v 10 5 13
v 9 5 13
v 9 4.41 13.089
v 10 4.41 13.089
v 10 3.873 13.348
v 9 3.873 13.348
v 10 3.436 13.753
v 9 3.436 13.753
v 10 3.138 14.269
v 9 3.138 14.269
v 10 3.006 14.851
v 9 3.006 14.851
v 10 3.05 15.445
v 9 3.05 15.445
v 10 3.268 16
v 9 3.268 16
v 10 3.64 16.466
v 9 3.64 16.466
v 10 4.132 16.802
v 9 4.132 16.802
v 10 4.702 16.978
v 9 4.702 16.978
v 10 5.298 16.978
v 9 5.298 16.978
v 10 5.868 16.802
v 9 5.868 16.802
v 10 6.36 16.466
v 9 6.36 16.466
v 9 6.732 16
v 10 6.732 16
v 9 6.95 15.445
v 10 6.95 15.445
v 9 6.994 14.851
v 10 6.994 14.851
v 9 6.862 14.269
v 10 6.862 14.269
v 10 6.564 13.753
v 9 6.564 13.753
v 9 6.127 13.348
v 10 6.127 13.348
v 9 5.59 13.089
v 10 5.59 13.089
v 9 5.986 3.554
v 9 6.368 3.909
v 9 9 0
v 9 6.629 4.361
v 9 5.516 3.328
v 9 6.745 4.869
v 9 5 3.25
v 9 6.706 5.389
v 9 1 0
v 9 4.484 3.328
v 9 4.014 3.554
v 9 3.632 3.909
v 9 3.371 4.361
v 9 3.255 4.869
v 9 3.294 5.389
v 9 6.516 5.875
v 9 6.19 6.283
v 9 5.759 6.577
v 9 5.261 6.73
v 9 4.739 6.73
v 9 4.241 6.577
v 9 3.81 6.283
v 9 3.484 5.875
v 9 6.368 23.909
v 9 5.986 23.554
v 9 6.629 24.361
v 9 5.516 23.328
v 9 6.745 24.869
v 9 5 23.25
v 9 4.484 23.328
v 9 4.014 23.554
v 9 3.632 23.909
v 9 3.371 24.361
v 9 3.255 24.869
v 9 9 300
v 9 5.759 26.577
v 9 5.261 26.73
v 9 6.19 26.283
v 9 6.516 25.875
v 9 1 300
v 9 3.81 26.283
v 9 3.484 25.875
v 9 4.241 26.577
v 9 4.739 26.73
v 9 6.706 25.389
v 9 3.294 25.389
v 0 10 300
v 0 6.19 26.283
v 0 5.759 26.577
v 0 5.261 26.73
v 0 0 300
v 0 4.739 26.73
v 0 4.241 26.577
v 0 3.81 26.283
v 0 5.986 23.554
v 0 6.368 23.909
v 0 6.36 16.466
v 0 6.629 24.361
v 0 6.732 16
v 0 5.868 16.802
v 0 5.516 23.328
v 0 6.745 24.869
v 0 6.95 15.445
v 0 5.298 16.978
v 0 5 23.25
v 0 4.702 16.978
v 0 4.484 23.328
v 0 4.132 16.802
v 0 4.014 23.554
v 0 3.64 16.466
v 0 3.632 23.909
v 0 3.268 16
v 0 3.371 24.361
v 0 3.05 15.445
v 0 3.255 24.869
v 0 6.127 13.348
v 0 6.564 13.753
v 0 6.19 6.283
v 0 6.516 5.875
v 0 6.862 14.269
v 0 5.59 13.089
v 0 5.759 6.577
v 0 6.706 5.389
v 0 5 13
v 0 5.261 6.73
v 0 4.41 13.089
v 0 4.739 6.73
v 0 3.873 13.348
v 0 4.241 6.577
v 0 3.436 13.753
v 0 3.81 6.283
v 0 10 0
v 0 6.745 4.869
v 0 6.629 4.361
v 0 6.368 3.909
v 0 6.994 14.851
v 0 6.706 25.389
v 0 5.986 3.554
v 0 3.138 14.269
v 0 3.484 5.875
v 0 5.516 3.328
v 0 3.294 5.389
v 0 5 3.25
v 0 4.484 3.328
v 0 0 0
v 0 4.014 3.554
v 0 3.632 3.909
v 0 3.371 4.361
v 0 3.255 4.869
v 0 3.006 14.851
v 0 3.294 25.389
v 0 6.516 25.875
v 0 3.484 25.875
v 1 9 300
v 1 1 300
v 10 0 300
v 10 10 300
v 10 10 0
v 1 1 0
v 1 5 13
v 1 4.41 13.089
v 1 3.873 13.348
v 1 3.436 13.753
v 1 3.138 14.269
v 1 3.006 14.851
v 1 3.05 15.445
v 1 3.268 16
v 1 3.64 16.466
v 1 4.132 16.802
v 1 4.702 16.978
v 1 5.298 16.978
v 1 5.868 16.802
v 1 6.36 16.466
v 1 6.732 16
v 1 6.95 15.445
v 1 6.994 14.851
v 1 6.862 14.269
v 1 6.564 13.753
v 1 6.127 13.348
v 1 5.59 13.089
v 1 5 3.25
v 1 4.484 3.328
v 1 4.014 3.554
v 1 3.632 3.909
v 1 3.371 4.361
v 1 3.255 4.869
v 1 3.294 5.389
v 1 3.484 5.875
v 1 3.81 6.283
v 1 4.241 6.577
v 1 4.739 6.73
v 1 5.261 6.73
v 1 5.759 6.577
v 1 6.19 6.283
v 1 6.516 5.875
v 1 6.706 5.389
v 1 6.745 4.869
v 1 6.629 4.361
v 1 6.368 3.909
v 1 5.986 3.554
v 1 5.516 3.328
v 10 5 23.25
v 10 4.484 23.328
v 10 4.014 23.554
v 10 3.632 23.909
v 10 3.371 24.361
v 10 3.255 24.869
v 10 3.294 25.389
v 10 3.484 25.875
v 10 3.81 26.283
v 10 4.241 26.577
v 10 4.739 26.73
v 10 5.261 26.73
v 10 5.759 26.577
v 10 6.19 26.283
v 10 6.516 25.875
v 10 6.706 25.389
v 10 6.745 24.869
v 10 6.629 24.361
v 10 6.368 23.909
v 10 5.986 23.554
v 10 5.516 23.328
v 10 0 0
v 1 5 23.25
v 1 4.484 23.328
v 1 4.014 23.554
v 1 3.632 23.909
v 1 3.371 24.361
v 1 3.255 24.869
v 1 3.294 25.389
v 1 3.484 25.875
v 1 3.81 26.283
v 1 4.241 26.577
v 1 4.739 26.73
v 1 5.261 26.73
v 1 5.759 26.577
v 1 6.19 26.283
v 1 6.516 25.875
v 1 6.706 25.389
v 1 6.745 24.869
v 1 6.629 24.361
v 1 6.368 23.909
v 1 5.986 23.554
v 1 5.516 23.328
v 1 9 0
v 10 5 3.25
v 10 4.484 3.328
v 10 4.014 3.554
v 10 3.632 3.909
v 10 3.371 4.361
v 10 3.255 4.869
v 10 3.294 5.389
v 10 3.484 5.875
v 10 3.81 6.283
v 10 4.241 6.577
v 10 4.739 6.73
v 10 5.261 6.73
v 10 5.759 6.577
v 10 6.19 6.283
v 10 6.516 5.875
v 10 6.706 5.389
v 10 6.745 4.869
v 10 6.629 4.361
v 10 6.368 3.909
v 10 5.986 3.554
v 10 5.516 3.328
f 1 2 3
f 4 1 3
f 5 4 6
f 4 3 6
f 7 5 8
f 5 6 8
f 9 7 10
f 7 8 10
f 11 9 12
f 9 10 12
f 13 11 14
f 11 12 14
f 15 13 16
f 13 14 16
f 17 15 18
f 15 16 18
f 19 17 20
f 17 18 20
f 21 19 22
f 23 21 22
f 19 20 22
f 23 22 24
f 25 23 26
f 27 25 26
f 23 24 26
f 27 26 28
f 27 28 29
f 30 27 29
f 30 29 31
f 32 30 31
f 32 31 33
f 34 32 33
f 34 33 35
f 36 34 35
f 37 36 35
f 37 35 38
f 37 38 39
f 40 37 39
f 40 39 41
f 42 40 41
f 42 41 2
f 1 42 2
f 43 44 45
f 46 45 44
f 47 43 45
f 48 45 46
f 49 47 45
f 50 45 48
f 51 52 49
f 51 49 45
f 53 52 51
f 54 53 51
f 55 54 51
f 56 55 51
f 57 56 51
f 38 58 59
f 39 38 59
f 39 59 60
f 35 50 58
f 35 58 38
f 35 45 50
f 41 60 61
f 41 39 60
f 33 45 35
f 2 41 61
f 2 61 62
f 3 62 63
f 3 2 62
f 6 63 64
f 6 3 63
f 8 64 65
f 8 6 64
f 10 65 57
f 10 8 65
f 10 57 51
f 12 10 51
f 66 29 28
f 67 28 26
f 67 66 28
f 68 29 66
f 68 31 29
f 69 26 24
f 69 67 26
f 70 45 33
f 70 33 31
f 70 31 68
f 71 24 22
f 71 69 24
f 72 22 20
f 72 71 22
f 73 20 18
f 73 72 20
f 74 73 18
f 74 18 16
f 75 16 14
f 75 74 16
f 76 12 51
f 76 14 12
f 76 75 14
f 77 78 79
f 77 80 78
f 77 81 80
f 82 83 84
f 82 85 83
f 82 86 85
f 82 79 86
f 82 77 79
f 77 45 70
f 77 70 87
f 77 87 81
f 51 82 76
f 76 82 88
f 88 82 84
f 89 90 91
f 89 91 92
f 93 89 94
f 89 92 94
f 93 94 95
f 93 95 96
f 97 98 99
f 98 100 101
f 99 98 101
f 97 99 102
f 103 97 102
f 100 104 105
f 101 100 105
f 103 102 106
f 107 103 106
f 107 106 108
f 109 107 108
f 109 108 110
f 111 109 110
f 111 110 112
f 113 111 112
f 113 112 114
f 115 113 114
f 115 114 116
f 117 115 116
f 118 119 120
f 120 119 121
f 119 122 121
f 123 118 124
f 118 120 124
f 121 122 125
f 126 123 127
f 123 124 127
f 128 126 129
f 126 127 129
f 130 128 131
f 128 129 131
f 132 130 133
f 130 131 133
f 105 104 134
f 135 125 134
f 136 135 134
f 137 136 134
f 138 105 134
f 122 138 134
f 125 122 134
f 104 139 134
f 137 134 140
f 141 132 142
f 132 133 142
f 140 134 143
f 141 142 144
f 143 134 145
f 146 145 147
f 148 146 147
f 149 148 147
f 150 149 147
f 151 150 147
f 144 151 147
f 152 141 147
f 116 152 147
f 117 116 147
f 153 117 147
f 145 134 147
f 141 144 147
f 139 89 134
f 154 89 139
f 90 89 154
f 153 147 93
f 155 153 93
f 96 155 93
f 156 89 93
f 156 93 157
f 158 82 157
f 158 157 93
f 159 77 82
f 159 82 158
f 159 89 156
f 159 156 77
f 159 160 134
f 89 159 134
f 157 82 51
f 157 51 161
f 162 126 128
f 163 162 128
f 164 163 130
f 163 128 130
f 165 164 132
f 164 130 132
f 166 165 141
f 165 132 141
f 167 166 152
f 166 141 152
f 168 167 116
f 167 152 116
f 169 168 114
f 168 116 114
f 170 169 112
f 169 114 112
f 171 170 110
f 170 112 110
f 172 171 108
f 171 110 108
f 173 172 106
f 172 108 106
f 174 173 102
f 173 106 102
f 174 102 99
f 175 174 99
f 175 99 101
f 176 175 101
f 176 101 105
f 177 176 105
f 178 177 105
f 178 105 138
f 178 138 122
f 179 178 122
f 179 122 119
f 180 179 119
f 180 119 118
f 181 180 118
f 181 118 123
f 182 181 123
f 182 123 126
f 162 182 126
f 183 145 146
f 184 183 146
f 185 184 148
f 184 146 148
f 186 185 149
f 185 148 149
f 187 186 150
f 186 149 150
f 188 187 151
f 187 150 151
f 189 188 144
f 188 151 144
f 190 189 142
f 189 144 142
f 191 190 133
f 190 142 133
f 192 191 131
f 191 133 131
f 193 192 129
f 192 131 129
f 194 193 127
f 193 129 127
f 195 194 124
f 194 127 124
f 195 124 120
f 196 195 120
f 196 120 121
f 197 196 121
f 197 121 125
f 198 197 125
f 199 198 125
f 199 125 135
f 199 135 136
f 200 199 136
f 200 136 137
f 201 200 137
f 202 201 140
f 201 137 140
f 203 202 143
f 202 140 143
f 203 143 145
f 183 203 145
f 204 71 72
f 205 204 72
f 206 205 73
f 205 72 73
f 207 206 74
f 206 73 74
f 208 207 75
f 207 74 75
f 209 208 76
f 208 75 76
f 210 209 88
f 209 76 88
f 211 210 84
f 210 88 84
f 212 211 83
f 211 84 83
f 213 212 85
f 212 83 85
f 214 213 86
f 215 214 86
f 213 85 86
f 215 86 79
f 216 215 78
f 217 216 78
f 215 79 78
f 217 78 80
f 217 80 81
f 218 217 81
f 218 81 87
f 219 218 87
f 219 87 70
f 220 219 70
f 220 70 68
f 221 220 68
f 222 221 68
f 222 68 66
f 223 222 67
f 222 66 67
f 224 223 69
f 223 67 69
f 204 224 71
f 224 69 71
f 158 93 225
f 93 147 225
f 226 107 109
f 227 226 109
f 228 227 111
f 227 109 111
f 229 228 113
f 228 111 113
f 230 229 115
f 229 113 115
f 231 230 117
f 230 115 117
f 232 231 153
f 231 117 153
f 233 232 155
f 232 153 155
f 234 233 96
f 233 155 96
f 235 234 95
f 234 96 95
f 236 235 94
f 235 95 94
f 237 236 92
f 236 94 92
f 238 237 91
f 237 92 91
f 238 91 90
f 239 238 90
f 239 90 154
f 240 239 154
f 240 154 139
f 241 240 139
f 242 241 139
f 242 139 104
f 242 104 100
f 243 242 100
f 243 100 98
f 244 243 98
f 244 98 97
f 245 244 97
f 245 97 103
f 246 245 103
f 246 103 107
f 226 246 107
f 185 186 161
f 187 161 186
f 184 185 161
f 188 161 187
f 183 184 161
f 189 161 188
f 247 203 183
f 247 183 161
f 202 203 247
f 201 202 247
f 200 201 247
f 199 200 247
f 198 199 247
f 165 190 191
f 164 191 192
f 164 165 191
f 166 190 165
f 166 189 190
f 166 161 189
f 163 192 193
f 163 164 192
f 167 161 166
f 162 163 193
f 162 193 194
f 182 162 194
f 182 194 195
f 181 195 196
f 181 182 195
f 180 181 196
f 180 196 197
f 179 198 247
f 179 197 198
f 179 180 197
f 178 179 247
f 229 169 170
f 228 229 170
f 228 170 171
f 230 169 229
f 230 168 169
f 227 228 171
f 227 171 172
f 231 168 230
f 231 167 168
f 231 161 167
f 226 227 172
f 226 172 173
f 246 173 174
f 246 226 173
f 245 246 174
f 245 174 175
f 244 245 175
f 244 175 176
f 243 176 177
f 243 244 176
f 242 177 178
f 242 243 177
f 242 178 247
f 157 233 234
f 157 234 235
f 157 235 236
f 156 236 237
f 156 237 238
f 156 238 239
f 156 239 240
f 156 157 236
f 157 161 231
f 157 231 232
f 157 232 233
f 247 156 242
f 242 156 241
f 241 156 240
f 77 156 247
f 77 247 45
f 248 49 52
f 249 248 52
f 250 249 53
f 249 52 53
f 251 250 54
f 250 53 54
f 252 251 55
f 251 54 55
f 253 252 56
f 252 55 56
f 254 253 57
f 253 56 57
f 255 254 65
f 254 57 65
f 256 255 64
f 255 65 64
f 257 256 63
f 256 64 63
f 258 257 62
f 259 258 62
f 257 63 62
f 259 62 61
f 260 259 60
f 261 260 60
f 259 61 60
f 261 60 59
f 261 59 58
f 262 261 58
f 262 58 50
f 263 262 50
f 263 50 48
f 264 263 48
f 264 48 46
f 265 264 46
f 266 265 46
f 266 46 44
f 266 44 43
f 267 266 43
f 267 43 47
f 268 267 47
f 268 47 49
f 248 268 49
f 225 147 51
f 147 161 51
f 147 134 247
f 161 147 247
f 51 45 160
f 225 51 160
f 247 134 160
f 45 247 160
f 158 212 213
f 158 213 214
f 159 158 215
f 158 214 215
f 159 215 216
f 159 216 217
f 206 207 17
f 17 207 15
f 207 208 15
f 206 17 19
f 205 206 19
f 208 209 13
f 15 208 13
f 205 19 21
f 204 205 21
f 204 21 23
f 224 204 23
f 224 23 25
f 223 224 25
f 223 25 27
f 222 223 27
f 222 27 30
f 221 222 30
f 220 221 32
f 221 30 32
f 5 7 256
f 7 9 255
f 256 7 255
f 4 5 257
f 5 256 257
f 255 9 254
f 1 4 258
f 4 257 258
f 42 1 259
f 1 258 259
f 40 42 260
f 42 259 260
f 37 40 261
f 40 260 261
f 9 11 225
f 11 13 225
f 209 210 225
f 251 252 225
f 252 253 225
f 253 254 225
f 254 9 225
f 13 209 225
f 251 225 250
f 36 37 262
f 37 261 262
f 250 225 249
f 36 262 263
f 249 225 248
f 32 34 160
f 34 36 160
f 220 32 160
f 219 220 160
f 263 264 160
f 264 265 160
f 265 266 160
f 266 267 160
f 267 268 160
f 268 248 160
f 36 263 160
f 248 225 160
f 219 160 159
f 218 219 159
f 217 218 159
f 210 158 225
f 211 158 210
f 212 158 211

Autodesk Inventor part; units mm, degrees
ref_plane "YZ Plane" through (0, 0, 0) normal (1, 0, 0) x (0, 1, 0)
ref_plane "XZ Plane" through (0, 0, 0) normal (0, 1, 0) x (-1, 0, 0)
ref_plane "XY Plane" through (0, 0, 0) normal (0, 0, 1) x (1, 0, 0)
sketch "スケッチ1" plane through (0, 0, 0) normal (0, 0, 1) x (1, 0, 0)
  line L0 (0, 0) -> (10, 0)
  line L1 (10, 0) -> (10, 10)
  line L2 (10, 10) -> (0, 10)
  line L3 (0, 10) -> (0, 0)
  dimension "d0" = 10
  dimension "d1" = 10
extrude "押し出し1" add sketch "スケッチ1" along normal blind 300
sketch "スケッチ2" plane through (0, 0, 300) normal (0, 0, 1) x (1, 0, 0)
  line L0 (1, 9) -> (9, 9)
  line L1 (9, 9) -> (9, 1)
  line L2 (9, 1) -> (1, 1)
  line L3 (1, 1) -> (1, 9)
  line L4 (10, 10) -> (0, 10) projected
  line L5 (10, 0) -> (10, 10) projected
  line L6 (0, 0) -> (10, 0) projected
  line L7 (0, 10) -> (0, 0) projected
  dimension "d4" = 1
  dimension "d5" = 1
  dimension "d6" = 1
  dimension "d7" = 1
extrude "押し出し2" cut sketch "スケッチ2" against normal through all contours L0 L1 L2 L3
sketch "スケッチ3" plane through (10, 0, 0) normal (1, 0, 0) x (0, 0, -1)
  line L0 (0, 0) -> (0, 10) projected
  point P0 (-15, 5)
  dimension "d10" = 15
hole "穴1" at (10, 5, 15) direction (-1, 0, 0) diameter 4 end through all
sketch "スケッチ4" plane through (10, 0, 0) normal (1, 0, 0) x (0, 0, -1)
  line L0 (0, 0) -> (0, 10) projected
  line L1 (0, 0) -> (-300, 0) projected
  point P0 (-5, 5)
  point P1 (-25, 5)
  dimension "d18" = 5
  dimension "d19" = 5
  dimension "d20" = 25
hole "穴2" at (10, 5, 5) at (10, 5, 25) direction (-1, 0, 0) diameter 3.5 end through all
properties part number "3SR06_振子"
